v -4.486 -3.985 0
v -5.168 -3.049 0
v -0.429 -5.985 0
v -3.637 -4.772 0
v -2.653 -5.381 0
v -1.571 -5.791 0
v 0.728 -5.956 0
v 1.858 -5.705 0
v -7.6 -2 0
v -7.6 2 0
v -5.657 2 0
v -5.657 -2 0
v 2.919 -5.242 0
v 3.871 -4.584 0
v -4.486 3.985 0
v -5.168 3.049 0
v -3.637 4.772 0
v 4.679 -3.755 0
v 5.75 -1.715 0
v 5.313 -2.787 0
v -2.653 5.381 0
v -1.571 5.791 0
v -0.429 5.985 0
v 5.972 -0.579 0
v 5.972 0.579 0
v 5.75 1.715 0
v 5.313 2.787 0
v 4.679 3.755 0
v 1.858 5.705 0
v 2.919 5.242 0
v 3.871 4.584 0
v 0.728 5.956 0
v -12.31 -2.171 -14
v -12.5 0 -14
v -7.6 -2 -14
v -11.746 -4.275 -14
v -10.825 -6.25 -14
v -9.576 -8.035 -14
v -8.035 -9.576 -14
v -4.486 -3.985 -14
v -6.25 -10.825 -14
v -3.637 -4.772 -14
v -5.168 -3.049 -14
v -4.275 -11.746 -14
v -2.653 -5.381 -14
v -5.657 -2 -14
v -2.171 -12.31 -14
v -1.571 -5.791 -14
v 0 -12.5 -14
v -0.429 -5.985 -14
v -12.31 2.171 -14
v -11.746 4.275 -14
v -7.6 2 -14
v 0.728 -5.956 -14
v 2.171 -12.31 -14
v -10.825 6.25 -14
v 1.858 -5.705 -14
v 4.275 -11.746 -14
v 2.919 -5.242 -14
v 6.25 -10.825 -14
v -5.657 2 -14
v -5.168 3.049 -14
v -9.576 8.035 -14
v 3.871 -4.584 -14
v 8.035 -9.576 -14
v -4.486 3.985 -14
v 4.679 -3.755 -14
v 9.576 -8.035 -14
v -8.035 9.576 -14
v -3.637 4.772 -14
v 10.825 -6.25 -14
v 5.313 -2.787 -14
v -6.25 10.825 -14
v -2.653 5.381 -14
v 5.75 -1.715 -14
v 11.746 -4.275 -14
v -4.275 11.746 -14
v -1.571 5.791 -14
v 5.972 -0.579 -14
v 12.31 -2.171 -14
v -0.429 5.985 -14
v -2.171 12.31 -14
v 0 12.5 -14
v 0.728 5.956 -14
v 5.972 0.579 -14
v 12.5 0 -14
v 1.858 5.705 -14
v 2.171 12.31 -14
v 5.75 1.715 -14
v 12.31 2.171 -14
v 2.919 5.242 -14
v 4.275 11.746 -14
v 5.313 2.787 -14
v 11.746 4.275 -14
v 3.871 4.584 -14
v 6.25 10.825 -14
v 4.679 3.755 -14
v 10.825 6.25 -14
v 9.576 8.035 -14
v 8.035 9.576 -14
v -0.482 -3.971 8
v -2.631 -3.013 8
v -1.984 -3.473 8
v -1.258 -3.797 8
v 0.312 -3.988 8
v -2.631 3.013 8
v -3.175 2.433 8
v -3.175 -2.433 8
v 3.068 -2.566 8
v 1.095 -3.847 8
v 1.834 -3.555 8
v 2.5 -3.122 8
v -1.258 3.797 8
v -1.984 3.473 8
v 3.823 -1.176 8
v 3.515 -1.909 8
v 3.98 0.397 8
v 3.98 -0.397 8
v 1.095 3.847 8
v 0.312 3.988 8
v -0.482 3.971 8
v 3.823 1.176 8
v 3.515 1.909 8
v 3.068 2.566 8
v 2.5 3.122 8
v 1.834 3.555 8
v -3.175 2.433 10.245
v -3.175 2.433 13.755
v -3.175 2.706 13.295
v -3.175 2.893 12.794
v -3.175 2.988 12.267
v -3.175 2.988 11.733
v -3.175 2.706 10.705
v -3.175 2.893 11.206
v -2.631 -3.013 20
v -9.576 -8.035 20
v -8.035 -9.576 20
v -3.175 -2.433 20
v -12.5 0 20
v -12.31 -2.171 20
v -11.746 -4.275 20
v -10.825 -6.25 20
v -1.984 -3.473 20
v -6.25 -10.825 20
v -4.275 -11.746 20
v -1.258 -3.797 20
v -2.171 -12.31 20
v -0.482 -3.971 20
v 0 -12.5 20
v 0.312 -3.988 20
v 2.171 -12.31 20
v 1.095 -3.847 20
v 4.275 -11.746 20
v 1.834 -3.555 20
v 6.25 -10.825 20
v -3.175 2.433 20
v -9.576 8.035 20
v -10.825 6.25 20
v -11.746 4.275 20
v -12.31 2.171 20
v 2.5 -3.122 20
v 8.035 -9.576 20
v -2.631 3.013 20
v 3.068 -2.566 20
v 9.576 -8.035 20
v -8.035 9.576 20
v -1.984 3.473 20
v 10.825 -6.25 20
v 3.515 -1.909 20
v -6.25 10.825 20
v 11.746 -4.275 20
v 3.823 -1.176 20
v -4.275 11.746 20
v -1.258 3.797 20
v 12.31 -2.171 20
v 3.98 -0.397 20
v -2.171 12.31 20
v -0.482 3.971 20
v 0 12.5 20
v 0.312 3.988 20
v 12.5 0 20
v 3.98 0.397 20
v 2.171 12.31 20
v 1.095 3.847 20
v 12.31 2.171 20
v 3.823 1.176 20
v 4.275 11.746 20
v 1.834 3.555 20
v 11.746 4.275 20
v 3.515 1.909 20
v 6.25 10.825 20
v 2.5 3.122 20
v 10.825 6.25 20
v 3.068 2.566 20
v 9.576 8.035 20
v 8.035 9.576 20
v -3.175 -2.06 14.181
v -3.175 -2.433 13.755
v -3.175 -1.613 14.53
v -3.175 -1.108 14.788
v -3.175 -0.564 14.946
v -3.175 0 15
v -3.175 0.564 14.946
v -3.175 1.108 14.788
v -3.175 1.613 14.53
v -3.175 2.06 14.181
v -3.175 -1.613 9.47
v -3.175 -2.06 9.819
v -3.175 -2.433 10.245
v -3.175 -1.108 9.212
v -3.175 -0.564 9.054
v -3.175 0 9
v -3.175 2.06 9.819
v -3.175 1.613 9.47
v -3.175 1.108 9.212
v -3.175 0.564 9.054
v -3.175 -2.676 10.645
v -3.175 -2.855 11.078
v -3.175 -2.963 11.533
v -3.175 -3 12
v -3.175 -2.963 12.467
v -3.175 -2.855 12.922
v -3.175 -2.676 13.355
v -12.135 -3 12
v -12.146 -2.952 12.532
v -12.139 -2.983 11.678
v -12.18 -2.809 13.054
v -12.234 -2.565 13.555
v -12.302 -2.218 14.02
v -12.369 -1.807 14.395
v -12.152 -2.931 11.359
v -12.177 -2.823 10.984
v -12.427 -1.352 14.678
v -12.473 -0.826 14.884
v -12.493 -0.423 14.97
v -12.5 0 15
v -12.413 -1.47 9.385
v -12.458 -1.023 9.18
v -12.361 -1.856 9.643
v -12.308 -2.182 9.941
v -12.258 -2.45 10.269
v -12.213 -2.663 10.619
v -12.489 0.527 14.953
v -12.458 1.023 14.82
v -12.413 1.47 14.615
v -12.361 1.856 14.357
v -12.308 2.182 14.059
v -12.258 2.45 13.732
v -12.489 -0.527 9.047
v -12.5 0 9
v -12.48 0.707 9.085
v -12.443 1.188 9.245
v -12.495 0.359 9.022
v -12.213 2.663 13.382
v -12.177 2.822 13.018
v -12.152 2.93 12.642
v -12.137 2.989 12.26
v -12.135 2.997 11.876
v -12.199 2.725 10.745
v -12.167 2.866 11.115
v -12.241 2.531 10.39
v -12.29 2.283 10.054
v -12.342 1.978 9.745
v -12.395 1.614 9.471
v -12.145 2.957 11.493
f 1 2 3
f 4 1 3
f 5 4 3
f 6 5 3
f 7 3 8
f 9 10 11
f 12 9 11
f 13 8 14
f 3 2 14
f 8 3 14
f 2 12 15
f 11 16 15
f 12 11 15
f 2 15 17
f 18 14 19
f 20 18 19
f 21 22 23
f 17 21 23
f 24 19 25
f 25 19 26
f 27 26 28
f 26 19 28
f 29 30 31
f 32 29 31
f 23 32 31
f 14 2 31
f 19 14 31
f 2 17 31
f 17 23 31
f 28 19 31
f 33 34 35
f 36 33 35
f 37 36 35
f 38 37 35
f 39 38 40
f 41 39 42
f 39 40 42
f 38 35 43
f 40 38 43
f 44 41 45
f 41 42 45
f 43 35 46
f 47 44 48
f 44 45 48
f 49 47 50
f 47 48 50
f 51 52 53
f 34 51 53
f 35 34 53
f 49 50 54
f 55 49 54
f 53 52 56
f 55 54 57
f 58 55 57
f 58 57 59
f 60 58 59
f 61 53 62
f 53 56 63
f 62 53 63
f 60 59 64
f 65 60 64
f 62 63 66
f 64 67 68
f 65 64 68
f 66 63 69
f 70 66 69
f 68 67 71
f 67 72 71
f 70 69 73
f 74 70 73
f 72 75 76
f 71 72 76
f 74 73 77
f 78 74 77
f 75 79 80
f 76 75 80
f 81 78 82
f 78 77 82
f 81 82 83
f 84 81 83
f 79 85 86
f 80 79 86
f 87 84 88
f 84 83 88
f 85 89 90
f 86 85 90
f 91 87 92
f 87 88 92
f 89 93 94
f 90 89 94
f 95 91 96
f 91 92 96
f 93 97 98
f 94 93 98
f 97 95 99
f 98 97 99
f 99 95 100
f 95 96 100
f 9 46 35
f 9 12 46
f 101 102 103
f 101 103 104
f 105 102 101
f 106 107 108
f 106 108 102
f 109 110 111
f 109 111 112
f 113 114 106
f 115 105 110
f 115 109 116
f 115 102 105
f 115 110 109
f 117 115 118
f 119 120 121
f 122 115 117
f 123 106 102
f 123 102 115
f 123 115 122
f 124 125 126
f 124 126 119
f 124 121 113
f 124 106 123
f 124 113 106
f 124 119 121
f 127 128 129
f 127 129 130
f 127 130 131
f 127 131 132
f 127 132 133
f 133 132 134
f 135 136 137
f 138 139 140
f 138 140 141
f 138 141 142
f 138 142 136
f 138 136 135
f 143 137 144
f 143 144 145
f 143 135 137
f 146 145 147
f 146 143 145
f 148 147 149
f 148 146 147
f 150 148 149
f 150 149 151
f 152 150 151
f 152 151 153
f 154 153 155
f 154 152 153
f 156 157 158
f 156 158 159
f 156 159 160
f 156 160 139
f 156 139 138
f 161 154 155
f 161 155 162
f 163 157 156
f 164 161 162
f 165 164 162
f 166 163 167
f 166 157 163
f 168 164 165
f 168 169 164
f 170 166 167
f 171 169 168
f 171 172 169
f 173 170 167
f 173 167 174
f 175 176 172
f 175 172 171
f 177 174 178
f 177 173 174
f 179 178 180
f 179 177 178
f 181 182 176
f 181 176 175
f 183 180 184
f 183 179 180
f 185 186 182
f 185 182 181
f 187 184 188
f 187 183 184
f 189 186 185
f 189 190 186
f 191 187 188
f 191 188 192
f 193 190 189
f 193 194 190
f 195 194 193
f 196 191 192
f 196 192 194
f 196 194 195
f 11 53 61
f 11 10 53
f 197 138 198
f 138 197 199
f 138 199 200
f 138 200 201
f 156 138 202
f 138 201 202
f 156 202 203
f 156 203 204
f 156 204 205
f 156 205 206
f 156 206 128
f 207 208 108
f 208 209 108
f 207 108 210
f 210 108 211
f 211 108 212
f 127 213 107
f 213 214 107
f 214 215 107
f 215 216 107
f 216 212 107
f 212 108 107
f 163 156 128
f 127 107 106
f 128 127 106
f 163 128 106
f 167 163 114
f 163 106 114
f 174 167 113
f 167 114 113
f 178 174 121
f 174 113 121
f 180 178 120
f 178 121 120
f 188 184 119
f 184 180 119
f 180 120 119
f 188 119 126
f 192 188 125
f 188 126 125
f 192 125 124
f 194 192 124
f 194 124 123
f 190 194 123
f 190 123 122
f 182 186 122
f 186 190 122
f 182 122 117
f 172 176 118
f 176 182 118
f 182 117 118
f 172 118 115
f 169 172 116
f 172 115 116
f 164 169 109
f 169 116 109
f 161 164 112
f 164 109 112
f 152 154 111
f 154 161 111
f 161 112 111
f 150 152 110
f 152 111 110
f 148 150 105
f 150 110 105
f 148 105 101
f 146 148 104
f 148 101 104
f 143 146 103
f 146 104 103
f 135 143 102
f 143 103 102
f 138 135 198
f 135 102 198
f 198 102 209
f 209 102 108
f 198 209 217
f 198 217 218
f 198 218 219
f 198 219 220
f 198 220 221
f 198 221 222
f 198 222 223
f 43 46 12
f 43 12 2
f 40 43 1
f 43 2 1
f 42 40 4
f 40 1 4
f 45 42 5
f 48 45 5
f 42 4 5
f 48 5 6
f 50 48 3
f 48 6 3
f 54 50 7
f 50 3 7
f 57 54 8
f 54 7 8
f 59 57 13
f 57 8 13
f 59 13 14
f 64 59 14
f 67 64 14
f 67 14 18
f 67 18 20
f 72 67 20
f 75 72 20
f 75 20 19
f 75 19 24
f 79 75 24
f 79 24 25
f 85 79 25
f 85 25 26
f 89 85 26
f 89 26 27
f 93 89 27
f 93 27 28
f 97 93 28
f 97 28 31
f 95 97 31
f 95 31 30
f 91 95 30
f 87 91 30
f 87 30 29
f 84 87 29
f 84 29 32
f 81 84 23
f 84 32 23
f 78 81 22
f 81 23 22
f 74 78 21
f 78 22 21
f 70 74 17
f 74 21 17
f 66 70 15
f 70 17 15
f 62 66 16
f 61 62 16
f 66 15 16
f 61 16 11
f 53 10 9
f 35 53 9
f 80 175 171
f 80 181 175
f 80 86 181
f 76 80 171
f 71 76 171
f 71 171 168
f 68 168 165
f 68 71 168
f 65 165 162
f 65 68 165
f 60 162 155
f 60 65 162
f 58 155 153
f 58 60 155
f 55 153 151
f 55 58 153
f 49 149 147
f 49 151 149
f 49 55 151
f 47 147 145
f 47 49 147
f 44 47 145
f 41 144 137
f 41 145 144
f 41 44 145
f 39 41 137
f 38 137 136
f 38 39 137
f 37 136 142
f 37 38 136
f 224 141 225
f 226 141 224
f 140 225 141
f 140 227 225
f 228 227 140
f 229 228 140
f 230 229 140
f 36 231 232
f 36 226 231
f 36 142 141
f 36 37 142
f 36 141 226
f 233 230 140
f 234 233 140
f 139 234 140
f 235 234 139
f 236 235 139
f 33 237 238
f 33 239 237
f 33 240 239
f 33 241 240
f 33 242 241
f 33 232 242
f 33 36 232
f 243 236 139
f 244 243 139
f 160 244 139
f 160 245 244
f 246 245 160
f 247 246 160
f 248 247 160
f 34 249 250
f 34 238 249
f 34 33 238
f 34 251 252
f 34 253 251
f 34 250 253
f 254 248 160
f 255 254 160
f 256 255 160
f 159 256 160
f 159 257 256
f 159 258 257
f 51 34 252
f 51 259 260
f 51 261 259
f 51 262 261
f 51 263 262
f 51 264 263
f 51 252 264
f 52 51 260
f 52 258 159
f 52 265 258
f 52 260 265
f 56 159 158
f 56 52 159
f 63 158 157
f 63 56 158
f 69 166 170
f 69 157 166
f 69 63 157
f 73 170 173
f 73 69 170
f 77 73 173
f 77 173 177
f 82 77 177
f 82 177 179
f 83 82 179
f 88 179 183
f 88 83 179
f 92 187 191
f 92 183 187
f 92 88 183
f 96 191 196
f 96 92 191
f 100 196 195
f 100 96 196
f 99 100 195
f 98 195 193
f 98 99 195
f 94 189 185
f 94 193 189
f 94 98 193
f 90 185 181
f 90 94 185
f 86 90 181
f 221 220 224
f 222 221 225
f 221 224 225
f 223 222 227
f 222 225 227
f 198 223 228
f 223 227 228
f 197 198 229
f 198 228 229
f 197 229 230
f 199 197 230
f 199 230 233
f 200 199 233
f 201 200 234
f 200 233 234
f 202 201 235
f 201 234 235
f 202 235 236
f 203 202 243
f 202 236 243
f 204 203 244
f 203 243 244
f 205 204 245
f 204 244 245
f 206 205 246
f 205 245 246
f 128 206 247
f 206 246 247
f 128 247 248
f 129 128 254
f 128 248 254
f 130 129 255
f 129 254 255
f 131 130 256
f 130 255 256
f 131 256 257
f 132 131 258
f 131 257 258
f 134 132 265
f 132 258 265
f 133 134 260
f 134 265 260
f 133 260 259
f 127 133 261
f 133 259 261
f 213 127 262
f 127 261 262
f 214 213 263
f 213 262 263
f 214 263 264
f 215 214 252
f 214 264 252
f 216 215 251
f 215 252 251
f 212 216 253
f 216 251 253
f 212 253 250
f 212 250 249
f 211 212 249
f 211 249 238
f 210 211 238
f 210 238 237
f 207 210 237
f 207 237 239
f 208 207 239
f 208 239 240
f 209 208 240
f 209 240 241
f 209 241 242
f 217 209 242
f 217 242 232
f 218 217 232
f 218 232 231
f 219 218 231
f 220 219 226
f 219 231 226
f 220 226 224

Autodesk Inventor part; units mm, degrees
ref_plane "YZ Plane" through (0, 0, 0) normal (1, 0, 0) x (0, 1, 0)
ref_plane "XZ Plane" through (0, 0, 0) normal (0, 1, 0) x (-1, 0, 0)
sketch "Sketch1" plane through (0, 0, 0) normal (0, 0, 1) x (1, 0, 0)
  circle A0 centre (0, 0) radius 6 projected
  line L0 (-7.6, 2) -> (-5.6569, 2) projected
  line L1 (-7.6, 2) -> (-7.6, -2) projected
  line L2 (-5.6569, -2) -> (-7.6, -2) projected
  circle A1 centre (0, 0) radius 12.5
  point P0 (0, 0)
  dimension "d0" = 25
extrude "Extrusion1" add sketch "Sketch1" against normal blind 14
sketch "Sketch2" plane through (0, 0, 0) normal (0, 0, 1) x (1, 0, 0)
  arc A0 (19.4059, 4.8385) -> (16.8372, 10.794) centre (0, 0) ccw projected
  circle A1 centre (0, 0) radius 12.5 projected
  point P0 (0, 0)
extrude "Extrusion2" add sketch "Sketch2" along normal blind 8
sketch "Sketch3" plane through (0, 0, 8) normal (0, 0, 1) x (1, 0, 0)
  circle A0 centre (0, 0) radius 12.5 projected
  line L0 (-3.175, -2.433) -> (-3.175, 2.433) projected
  arc A1 (-3.175, -2.433) -> (-3.175, 2.433) centre (0, 0) ccw projected
  point P0 (0, 0)
extrude "Extrusion3" add sketch "Sketch3" along normal blind 12
ref_plane "Work Plane2" through (-12.5, 0, 0) normal (-1, 0, 0) x (0, -1, 0)
ref_plane "Work Plane1" through (-3.175, -2.433, 10) normal (-1, 0, 0) x (0, 1, 0)
sketch "Sketch4" plane through (-12.5, 0, 0) normal (-1, 0, 0) x (0, -1, 0)
  circle A0 centre (0, 12) radius 3
  line L0 (12.5, 20) -> (-12.5, 20) projected
  point P0 (0, 0)
  dimension "d7" = 8
  dimension "d8" = 6
ref_plane "Work Plane3" through (-3.175, -2.433, 10) normal (-1, 0, 0) x (0, 0, 1)
extrude "Extrusion4" cut sketch "Sketch4" against normal up to surface (9.325 mm away)
thread "Thread1" size "M6x1" class "6H" standard "ANSI Metric M Profile" length 20
properties part number "nmrv-50 to megatroque motor coupler"
